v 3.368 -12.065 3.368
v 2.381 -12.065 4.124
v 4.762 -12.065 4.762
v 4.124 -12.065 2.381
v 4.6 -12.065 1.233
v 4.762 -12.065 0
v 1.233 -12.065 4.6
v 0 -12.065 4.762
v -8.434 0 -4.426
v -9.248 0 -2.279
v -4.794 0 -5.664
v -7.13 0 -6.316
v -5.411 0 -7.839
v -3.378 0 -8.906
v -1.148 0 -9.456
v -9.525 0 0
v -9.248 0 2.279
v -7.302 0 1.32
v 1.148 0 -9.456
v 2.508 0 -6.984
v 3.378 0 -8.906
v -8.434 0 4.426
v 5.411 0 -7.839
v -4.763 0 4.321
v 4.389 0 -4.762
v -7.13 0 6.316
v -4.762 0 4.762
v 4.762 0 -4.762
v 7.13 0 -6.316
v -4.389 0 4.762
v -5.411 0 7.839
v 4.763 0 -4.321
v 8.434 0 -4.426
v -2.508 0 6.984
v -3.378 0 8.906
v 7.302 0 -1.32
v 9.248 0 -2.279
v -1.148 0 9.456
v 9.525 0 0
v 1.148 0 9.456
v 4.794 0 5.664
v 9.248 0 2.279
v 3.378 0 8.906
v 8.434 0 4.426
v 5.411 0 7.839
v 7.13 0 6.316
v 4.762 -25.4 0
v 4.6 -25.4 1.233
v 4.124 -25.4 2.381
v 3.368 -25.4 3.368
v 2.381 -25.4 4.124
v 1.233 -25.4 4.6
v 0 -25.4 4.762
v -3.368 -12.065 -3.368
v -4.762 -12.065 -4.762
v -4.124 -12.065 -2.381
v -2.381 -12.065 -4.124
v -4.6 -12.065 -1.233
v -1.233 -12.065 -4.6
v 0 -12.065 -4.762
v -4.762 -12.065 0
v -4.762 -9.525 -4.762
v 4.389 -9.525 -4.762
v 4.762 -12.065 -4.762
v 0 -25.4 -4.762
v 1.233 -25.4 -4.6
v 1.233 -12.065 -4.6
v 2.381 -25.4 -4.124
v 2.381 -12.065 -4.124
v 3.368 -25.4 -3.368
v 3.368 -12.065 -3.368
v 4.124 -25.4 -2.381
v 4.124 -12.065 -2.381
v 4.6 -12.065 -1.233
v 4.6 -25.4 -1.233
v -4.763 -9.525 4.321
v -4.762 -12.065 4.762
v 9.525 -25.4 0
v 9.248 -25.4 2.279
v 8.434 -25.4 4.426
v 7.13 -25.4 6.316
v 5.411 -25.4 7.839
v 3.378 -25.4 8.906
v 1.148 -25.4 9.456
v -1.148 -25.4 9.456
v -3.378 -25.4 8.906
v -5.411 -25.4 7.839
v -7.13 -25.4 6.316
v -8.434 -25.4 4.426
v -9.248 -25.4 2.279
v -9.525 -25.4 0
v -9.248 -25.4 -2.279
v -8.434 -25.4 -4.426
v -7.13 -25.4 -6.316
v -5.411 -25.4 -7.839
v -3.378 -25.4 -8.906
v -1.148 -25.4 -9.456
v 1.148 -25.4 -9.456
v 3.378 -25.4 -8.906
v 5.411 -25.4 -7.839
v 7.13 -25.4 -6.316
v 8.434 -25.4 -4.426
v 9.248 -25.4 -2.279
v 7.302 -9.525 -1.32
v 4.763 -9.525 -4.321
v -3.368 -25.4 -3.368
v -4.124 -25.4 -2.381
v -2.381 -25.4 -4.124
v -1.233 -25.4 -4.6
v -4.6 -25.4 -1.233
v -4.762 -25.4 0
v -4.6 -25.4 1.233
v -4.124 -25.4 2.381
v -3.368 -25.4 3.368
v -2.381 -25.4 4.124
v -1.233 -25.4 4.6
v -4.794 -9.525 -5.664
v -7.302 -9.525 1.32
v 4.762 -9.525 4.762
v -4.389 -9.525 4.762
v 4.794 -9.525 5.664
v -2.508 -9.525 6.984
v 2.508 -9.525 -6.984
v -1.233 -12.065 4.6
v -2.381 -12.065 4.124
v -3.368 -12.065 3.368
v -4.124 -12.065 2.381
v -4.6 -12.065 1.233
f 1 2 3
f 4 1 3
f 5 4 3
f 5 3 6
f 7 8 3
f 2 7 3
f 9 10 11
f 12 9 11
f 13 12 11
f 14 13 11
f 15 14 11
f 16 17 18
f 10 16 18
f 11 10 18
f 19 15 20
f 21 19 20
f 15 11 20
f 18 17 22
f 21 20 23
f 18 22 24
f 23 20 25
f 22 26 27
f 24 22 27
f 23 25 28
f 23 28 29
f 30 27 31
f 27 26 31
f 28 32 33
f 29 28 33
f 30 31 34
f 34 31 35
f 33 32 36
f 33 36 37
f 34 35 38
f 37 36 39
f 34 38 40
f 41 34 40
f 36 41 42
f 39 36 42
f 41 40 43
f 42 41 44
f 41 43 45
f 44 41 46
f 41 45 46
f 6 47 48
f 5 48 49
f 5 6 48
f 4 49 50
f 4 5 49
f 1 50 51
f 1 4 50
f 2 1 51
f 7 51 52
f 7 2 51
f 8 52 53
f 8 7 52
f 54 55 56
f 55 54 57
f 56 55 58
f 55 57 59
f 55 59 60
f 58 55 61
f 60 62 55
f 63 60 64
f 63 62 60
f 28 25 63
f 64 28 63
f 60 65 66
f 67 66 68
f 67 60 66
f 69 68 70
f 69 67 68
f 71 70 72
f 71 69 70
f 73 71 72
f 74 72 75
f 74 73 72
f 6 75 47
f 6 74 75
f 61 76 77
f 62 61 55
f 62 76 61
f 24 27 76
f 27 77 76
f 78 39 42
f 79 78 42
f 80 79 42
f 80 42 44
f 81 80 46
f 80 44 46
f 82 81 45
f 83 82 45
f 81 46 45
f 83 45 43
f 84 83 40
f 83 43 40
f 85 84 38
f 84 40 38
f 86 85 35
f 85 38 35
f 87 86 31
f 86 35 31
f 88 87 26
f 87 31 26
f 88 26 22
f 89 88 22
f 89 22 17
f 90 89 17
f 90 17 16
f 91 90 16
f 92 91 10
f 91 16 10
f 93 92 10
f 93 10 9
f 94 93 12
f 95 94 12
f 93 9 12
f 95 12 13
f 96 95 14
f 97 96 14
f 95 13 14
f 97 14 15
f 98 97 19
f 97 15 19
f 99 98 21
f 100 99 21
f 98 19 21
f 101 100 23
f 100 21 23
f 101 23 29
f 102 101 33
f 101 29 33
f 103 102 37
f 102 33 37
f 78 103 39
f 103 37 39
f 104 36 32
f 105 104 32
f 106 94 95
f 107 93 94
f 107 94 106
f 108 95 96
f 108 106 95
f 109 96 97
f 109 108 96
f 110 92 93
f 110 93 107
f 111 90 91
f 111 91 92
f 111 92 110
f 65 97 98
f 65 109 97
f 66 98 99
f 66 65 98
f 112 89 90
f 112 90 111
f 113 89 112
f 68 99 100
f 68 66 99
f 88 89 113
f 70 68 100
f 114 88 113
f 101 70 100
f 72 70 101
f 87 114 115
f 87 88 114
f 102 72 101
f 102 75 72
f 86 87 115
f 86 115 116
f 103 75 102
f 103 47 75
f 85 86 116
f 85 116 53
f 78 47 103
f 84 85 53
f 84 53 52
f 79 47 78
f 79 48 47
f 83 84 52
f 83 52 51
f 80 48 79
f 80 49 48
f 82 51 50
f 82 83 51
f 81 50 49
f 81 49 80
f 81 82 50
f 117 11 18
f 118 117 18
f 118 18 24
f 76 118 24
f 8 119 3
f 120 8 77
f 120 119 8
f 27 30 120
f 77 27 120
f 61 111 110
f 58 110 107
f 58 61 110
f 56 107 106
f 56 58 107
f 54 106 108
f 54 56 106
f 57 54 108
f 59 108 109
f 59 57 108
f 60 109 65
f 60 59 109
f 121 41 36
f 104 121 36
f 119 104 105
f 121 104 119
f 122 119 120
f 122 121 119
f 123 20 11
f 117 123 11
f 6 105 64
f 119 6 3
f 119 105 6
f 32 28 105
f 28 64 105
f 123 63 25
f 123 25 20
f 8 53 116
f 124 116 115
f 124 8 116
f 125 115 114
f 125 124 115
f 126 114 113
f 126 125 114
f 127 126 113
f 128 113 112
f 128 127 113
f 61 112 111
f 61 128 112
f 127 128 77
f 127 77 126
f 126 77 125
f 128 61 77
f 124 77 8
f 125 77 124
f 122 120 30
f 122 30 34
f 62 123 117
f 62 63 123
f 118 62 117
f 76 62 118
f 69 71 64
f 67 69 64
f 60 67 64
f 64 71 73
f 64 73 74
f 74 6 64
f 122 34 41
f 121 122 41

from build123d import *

# Parameters (mm, degrees)
F0_R     = 9.525
F1_DEPTH = 25.4
F3_DEPTH = 25.401
F4_DEPTH = 12.065
F6_DEPTH = 9.525


with BuildPart() as f1:
    # F0 (on Front) → F1 (new body)
    with BuildSketch(Plane.XZ):
        Circle(F0_R)
    extrude(amount=F1_DEPTH)

    # F2 (on Front) → F3 (cut, through all)
    with BuildSketch(Plane.XZ):
        with BuildLine():
            ThreePointArc((-4.7625, 0), (-3.367596, -3.367596), (0, -4.7625))
            ThreePointArc((0, -4.7625), (3.367596, -3.367596), (4.7625, 0))
            ThreePointArc((4.7625, 0), (3.367596, 3.367596), (0, 4.7625))
            ThreePointArc((0, 4.7625), (-3.367596, 3.367596), (-4.7625, 0))
        make_face()
    extrude(amount=F3_DEPTH, mode=Mode.SUBTRACT)

    # F2 (on Front) → F4 (cut)
    with BuildSketch(Plane.XZ):
        with BuildLine():
            Line((0, -4.7625), (4.7625, -4.7625))
            Line((4.7625, -4.7625), (4.7625, 0))
            ThreePointArc((4.7625, 0), (3.367596, -3.367596), (0, -4.7625))
        make_face()
        with BuildLine():
            Line((-4.7625, -4.7625), (0, -4.7625))
            ThreePointArc((0, -4.7625), (-3.367596, -3.367596), (-4.7625, 0))
            Line((-4.7625, 0), (-4.7625, -4.7625))
        make_face()
        with BuildLine():
            ThreePointArc((0, 4.7625), (3.367596, 3.367596), (4.7625, 0))
            Line((4.7625, 0), (4.7625, 4.7625))
            Line((4.7625, 4.7625), (0, 4.7625))
        make_face()
        with BuildLine():
            Line((-4.7625, 4.7625), (-4.7625, 0))
            ThreePointArc((-4.7625, 0), (-3.367596, 3.367596), (0, 4.7625))
            Line((0, 4.7625), (-4.7625, 4.7625))
        make_face()
    extrude(amount=F4_DEPTH, mode=Mode.SUBTRACT)

    # F5 (on face) → F6 (cut)
    with BuildSketch(Plane(origin=(0, 0, 0), x_dir=(-1, 0, 0), z_dir=(0, 1, 0))):
        Polygon((4.794214, -5.66426), (7.3025, 1.319781), (2.508286, 6.984041), (-4.794214, 5.66426), (-7.3025, -1.319781), (-2.508286, -6.984041), align=None)
    extrude(amount=-F6_DEPTH, mode=Mode.SUBTRACT)


solid = f1.part
